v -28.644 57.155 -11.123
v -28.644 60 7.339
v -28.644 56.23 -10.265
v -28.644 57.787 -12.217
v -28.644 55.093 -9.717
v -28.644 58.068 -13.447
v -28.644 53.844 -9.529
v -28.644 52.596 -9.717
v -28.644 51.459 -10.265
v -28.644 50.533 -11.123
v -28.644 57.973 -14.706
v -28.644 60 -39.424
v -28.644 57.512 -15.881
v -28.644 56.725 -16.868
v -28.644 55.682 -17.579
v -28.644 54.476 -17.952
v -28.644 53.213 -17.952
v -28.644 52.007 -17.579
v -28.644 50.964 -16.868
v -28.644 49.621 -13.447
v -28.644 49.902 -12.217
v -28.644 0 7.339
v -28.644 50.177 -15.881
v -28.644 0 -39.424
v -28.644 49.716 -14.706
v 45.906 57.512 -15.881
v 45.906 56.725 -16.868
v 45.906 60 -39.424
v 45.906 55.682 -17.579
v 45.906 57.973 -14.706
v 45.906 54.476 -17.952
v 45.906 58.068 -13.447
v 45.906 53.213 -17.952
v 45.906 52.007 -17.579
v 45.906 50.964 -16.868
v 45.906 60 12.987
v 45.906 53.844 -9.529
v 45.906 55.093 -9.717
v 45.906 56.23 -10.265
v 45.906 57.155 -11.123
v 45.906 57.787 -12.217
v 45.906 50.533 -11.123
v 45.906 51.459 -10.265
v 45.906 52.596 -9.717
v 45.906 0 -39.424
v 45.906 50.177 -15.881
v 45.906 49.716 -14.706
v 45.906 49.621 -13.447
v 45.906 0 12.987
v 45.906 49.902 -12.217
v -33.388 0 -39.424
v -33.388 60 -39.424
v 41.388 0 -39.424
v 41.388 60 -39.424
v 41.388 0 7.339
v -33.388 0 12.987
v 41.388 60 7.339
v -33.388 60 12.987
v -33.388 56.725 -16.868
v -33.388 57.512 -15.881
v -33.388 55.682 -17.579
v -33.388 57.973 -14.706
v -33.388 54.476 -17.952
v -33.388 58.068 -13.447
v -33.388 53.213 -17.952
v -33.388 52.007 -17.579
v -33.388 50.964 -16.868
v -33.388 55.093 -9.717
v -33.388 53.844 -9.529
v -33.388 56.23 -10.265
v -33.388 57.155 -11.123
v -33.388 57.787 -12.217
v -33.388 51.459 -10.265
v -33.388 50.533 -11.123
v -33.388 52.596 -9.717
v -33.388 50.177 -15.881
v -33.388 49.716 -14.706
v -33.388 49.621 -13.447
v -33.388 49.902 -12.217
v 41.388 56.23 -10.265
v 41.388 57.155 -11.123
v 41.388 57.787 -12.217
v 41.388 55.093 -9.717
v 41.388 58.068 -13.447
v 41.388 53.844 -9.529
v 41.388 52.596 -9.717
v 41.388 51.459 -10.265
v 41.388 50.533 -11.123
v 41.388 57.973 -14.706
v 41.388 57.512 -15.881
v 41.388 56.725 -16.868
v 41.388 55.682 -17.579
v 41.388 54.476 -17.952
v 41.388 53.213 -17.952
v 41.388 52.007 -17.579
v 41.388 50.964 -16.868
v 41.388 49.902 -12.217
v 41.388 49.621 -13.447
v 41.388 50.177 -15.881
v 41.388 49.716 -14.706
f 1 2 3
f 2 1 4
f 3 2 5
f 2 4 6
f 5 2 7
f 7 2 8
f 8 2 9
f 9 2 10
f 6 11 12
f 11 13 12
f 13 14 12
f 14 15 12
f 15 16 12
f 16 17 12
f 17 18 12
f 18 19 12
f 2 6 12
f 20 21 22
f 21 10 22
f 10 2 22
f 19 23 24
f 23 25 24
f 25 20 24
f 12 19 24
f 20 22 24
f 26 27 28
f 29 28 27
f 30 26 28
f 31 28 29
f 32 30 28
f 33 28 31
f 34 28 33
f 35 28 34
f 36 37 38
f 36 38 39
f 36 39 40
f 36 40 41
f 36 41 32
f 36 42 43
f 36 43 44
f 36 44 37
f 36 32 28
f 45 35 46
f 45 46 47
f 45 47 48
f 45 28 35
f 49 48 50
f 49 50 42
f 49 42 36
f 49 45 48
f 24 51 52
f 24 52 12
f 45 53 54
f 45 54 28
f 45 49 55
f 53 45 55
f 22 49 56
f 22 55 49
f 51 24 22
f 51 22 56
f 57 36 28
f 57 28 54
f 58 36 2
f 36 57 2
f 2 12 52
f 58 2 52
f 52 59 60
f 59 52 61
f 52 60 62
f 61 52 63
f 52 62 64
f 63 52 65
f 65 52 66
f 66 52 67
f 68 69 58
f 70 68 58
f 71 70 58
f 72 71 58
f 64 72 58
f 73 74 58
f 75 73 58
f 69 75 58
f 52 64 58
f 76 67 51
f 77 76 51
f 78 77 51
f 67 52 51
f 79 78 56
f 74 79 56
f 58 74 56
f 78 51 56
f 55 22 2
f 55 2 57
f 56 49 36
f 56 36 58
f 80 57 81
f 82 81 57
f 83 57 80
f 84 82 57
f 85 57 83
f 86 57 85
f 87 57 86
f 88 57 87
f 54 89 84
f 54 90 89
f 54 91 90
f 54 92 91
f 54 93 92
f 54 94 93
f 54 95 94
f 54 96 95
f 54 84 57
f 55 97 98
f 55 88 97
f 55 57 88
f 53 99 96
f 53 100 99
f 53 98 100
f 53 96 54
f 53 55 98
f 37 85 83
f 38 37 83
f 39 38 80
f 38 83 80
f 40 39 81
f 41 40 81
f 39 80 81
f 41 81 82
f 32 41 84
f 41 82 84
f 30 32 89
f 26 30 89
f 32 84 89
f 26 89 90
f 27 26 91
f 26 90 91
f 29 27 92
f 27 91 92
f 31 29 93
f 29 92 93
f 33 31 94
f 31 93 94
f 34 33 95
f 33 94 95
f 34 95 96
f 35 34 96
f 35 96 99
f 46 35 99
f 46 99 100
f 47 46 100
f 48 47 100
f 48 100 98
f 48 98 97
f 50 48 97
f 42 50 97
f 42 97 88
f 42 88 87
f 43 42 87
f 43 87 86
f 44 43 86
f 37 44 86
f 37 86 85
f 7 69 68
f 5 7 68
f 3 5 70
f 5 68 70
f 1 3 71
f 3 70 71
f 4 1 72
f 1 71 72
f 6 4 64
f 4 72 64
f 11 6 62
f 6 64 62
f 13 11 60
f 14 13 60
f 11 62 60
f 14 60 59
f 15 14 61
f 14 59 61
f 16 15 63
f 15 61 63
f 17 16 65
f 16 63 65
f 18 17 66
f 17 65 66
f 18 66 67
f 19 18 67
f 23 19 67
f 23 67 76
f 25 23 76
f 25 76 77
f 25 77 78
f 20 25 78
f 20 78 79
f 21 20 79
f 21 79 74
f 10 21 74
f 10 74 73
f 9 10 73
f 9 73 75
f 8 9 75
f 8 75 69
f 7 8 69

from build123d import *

# Parameters (mm, degrees)
SALIENTE_EXTRUIR2_DEPTH = 60
CROQUIS4_R              = 4.23503961
CORTAR_EXTRUIR1_DEPTH   = 110


with BuildPart() as part:
    # Croquis3 → Saliente-Extruir2 (new body)
    with BuildSketch(Plane(origin=(0, 0, 0), x_dir=(1, 0, 0), z_dir=(0, 1, 0))):
        Polygon((-33.38838539, 0), (-33.38838539, 39.424440528), (-28.644268776, 39.424440528), (-28.644268776, 0), (-28.644268776, -7.338994669), (41.387928863, -7.338994669), (41.387928863, 39.424440528), (45.906135162, 39.424440528), (45.906135162, -12.986752543), (-33.38838539, -12.986752543), align=None)
    extrude(amount=SALIENTE_EXTRUIR2_DEPTH)

    # Croquis4 → Cortar-Extruir1 (cut)
    with BuildSketch(Plane.ZY.offset(33.38838539)):
        with Locations((-13.763852604, 53.844361948)):
            Circle(CROQUIS4_R)
    extrude(amount=-CORTAR_EXTRUIR1_DEPTH, mode=Mode.SUBTRACT)


solid = part.part
